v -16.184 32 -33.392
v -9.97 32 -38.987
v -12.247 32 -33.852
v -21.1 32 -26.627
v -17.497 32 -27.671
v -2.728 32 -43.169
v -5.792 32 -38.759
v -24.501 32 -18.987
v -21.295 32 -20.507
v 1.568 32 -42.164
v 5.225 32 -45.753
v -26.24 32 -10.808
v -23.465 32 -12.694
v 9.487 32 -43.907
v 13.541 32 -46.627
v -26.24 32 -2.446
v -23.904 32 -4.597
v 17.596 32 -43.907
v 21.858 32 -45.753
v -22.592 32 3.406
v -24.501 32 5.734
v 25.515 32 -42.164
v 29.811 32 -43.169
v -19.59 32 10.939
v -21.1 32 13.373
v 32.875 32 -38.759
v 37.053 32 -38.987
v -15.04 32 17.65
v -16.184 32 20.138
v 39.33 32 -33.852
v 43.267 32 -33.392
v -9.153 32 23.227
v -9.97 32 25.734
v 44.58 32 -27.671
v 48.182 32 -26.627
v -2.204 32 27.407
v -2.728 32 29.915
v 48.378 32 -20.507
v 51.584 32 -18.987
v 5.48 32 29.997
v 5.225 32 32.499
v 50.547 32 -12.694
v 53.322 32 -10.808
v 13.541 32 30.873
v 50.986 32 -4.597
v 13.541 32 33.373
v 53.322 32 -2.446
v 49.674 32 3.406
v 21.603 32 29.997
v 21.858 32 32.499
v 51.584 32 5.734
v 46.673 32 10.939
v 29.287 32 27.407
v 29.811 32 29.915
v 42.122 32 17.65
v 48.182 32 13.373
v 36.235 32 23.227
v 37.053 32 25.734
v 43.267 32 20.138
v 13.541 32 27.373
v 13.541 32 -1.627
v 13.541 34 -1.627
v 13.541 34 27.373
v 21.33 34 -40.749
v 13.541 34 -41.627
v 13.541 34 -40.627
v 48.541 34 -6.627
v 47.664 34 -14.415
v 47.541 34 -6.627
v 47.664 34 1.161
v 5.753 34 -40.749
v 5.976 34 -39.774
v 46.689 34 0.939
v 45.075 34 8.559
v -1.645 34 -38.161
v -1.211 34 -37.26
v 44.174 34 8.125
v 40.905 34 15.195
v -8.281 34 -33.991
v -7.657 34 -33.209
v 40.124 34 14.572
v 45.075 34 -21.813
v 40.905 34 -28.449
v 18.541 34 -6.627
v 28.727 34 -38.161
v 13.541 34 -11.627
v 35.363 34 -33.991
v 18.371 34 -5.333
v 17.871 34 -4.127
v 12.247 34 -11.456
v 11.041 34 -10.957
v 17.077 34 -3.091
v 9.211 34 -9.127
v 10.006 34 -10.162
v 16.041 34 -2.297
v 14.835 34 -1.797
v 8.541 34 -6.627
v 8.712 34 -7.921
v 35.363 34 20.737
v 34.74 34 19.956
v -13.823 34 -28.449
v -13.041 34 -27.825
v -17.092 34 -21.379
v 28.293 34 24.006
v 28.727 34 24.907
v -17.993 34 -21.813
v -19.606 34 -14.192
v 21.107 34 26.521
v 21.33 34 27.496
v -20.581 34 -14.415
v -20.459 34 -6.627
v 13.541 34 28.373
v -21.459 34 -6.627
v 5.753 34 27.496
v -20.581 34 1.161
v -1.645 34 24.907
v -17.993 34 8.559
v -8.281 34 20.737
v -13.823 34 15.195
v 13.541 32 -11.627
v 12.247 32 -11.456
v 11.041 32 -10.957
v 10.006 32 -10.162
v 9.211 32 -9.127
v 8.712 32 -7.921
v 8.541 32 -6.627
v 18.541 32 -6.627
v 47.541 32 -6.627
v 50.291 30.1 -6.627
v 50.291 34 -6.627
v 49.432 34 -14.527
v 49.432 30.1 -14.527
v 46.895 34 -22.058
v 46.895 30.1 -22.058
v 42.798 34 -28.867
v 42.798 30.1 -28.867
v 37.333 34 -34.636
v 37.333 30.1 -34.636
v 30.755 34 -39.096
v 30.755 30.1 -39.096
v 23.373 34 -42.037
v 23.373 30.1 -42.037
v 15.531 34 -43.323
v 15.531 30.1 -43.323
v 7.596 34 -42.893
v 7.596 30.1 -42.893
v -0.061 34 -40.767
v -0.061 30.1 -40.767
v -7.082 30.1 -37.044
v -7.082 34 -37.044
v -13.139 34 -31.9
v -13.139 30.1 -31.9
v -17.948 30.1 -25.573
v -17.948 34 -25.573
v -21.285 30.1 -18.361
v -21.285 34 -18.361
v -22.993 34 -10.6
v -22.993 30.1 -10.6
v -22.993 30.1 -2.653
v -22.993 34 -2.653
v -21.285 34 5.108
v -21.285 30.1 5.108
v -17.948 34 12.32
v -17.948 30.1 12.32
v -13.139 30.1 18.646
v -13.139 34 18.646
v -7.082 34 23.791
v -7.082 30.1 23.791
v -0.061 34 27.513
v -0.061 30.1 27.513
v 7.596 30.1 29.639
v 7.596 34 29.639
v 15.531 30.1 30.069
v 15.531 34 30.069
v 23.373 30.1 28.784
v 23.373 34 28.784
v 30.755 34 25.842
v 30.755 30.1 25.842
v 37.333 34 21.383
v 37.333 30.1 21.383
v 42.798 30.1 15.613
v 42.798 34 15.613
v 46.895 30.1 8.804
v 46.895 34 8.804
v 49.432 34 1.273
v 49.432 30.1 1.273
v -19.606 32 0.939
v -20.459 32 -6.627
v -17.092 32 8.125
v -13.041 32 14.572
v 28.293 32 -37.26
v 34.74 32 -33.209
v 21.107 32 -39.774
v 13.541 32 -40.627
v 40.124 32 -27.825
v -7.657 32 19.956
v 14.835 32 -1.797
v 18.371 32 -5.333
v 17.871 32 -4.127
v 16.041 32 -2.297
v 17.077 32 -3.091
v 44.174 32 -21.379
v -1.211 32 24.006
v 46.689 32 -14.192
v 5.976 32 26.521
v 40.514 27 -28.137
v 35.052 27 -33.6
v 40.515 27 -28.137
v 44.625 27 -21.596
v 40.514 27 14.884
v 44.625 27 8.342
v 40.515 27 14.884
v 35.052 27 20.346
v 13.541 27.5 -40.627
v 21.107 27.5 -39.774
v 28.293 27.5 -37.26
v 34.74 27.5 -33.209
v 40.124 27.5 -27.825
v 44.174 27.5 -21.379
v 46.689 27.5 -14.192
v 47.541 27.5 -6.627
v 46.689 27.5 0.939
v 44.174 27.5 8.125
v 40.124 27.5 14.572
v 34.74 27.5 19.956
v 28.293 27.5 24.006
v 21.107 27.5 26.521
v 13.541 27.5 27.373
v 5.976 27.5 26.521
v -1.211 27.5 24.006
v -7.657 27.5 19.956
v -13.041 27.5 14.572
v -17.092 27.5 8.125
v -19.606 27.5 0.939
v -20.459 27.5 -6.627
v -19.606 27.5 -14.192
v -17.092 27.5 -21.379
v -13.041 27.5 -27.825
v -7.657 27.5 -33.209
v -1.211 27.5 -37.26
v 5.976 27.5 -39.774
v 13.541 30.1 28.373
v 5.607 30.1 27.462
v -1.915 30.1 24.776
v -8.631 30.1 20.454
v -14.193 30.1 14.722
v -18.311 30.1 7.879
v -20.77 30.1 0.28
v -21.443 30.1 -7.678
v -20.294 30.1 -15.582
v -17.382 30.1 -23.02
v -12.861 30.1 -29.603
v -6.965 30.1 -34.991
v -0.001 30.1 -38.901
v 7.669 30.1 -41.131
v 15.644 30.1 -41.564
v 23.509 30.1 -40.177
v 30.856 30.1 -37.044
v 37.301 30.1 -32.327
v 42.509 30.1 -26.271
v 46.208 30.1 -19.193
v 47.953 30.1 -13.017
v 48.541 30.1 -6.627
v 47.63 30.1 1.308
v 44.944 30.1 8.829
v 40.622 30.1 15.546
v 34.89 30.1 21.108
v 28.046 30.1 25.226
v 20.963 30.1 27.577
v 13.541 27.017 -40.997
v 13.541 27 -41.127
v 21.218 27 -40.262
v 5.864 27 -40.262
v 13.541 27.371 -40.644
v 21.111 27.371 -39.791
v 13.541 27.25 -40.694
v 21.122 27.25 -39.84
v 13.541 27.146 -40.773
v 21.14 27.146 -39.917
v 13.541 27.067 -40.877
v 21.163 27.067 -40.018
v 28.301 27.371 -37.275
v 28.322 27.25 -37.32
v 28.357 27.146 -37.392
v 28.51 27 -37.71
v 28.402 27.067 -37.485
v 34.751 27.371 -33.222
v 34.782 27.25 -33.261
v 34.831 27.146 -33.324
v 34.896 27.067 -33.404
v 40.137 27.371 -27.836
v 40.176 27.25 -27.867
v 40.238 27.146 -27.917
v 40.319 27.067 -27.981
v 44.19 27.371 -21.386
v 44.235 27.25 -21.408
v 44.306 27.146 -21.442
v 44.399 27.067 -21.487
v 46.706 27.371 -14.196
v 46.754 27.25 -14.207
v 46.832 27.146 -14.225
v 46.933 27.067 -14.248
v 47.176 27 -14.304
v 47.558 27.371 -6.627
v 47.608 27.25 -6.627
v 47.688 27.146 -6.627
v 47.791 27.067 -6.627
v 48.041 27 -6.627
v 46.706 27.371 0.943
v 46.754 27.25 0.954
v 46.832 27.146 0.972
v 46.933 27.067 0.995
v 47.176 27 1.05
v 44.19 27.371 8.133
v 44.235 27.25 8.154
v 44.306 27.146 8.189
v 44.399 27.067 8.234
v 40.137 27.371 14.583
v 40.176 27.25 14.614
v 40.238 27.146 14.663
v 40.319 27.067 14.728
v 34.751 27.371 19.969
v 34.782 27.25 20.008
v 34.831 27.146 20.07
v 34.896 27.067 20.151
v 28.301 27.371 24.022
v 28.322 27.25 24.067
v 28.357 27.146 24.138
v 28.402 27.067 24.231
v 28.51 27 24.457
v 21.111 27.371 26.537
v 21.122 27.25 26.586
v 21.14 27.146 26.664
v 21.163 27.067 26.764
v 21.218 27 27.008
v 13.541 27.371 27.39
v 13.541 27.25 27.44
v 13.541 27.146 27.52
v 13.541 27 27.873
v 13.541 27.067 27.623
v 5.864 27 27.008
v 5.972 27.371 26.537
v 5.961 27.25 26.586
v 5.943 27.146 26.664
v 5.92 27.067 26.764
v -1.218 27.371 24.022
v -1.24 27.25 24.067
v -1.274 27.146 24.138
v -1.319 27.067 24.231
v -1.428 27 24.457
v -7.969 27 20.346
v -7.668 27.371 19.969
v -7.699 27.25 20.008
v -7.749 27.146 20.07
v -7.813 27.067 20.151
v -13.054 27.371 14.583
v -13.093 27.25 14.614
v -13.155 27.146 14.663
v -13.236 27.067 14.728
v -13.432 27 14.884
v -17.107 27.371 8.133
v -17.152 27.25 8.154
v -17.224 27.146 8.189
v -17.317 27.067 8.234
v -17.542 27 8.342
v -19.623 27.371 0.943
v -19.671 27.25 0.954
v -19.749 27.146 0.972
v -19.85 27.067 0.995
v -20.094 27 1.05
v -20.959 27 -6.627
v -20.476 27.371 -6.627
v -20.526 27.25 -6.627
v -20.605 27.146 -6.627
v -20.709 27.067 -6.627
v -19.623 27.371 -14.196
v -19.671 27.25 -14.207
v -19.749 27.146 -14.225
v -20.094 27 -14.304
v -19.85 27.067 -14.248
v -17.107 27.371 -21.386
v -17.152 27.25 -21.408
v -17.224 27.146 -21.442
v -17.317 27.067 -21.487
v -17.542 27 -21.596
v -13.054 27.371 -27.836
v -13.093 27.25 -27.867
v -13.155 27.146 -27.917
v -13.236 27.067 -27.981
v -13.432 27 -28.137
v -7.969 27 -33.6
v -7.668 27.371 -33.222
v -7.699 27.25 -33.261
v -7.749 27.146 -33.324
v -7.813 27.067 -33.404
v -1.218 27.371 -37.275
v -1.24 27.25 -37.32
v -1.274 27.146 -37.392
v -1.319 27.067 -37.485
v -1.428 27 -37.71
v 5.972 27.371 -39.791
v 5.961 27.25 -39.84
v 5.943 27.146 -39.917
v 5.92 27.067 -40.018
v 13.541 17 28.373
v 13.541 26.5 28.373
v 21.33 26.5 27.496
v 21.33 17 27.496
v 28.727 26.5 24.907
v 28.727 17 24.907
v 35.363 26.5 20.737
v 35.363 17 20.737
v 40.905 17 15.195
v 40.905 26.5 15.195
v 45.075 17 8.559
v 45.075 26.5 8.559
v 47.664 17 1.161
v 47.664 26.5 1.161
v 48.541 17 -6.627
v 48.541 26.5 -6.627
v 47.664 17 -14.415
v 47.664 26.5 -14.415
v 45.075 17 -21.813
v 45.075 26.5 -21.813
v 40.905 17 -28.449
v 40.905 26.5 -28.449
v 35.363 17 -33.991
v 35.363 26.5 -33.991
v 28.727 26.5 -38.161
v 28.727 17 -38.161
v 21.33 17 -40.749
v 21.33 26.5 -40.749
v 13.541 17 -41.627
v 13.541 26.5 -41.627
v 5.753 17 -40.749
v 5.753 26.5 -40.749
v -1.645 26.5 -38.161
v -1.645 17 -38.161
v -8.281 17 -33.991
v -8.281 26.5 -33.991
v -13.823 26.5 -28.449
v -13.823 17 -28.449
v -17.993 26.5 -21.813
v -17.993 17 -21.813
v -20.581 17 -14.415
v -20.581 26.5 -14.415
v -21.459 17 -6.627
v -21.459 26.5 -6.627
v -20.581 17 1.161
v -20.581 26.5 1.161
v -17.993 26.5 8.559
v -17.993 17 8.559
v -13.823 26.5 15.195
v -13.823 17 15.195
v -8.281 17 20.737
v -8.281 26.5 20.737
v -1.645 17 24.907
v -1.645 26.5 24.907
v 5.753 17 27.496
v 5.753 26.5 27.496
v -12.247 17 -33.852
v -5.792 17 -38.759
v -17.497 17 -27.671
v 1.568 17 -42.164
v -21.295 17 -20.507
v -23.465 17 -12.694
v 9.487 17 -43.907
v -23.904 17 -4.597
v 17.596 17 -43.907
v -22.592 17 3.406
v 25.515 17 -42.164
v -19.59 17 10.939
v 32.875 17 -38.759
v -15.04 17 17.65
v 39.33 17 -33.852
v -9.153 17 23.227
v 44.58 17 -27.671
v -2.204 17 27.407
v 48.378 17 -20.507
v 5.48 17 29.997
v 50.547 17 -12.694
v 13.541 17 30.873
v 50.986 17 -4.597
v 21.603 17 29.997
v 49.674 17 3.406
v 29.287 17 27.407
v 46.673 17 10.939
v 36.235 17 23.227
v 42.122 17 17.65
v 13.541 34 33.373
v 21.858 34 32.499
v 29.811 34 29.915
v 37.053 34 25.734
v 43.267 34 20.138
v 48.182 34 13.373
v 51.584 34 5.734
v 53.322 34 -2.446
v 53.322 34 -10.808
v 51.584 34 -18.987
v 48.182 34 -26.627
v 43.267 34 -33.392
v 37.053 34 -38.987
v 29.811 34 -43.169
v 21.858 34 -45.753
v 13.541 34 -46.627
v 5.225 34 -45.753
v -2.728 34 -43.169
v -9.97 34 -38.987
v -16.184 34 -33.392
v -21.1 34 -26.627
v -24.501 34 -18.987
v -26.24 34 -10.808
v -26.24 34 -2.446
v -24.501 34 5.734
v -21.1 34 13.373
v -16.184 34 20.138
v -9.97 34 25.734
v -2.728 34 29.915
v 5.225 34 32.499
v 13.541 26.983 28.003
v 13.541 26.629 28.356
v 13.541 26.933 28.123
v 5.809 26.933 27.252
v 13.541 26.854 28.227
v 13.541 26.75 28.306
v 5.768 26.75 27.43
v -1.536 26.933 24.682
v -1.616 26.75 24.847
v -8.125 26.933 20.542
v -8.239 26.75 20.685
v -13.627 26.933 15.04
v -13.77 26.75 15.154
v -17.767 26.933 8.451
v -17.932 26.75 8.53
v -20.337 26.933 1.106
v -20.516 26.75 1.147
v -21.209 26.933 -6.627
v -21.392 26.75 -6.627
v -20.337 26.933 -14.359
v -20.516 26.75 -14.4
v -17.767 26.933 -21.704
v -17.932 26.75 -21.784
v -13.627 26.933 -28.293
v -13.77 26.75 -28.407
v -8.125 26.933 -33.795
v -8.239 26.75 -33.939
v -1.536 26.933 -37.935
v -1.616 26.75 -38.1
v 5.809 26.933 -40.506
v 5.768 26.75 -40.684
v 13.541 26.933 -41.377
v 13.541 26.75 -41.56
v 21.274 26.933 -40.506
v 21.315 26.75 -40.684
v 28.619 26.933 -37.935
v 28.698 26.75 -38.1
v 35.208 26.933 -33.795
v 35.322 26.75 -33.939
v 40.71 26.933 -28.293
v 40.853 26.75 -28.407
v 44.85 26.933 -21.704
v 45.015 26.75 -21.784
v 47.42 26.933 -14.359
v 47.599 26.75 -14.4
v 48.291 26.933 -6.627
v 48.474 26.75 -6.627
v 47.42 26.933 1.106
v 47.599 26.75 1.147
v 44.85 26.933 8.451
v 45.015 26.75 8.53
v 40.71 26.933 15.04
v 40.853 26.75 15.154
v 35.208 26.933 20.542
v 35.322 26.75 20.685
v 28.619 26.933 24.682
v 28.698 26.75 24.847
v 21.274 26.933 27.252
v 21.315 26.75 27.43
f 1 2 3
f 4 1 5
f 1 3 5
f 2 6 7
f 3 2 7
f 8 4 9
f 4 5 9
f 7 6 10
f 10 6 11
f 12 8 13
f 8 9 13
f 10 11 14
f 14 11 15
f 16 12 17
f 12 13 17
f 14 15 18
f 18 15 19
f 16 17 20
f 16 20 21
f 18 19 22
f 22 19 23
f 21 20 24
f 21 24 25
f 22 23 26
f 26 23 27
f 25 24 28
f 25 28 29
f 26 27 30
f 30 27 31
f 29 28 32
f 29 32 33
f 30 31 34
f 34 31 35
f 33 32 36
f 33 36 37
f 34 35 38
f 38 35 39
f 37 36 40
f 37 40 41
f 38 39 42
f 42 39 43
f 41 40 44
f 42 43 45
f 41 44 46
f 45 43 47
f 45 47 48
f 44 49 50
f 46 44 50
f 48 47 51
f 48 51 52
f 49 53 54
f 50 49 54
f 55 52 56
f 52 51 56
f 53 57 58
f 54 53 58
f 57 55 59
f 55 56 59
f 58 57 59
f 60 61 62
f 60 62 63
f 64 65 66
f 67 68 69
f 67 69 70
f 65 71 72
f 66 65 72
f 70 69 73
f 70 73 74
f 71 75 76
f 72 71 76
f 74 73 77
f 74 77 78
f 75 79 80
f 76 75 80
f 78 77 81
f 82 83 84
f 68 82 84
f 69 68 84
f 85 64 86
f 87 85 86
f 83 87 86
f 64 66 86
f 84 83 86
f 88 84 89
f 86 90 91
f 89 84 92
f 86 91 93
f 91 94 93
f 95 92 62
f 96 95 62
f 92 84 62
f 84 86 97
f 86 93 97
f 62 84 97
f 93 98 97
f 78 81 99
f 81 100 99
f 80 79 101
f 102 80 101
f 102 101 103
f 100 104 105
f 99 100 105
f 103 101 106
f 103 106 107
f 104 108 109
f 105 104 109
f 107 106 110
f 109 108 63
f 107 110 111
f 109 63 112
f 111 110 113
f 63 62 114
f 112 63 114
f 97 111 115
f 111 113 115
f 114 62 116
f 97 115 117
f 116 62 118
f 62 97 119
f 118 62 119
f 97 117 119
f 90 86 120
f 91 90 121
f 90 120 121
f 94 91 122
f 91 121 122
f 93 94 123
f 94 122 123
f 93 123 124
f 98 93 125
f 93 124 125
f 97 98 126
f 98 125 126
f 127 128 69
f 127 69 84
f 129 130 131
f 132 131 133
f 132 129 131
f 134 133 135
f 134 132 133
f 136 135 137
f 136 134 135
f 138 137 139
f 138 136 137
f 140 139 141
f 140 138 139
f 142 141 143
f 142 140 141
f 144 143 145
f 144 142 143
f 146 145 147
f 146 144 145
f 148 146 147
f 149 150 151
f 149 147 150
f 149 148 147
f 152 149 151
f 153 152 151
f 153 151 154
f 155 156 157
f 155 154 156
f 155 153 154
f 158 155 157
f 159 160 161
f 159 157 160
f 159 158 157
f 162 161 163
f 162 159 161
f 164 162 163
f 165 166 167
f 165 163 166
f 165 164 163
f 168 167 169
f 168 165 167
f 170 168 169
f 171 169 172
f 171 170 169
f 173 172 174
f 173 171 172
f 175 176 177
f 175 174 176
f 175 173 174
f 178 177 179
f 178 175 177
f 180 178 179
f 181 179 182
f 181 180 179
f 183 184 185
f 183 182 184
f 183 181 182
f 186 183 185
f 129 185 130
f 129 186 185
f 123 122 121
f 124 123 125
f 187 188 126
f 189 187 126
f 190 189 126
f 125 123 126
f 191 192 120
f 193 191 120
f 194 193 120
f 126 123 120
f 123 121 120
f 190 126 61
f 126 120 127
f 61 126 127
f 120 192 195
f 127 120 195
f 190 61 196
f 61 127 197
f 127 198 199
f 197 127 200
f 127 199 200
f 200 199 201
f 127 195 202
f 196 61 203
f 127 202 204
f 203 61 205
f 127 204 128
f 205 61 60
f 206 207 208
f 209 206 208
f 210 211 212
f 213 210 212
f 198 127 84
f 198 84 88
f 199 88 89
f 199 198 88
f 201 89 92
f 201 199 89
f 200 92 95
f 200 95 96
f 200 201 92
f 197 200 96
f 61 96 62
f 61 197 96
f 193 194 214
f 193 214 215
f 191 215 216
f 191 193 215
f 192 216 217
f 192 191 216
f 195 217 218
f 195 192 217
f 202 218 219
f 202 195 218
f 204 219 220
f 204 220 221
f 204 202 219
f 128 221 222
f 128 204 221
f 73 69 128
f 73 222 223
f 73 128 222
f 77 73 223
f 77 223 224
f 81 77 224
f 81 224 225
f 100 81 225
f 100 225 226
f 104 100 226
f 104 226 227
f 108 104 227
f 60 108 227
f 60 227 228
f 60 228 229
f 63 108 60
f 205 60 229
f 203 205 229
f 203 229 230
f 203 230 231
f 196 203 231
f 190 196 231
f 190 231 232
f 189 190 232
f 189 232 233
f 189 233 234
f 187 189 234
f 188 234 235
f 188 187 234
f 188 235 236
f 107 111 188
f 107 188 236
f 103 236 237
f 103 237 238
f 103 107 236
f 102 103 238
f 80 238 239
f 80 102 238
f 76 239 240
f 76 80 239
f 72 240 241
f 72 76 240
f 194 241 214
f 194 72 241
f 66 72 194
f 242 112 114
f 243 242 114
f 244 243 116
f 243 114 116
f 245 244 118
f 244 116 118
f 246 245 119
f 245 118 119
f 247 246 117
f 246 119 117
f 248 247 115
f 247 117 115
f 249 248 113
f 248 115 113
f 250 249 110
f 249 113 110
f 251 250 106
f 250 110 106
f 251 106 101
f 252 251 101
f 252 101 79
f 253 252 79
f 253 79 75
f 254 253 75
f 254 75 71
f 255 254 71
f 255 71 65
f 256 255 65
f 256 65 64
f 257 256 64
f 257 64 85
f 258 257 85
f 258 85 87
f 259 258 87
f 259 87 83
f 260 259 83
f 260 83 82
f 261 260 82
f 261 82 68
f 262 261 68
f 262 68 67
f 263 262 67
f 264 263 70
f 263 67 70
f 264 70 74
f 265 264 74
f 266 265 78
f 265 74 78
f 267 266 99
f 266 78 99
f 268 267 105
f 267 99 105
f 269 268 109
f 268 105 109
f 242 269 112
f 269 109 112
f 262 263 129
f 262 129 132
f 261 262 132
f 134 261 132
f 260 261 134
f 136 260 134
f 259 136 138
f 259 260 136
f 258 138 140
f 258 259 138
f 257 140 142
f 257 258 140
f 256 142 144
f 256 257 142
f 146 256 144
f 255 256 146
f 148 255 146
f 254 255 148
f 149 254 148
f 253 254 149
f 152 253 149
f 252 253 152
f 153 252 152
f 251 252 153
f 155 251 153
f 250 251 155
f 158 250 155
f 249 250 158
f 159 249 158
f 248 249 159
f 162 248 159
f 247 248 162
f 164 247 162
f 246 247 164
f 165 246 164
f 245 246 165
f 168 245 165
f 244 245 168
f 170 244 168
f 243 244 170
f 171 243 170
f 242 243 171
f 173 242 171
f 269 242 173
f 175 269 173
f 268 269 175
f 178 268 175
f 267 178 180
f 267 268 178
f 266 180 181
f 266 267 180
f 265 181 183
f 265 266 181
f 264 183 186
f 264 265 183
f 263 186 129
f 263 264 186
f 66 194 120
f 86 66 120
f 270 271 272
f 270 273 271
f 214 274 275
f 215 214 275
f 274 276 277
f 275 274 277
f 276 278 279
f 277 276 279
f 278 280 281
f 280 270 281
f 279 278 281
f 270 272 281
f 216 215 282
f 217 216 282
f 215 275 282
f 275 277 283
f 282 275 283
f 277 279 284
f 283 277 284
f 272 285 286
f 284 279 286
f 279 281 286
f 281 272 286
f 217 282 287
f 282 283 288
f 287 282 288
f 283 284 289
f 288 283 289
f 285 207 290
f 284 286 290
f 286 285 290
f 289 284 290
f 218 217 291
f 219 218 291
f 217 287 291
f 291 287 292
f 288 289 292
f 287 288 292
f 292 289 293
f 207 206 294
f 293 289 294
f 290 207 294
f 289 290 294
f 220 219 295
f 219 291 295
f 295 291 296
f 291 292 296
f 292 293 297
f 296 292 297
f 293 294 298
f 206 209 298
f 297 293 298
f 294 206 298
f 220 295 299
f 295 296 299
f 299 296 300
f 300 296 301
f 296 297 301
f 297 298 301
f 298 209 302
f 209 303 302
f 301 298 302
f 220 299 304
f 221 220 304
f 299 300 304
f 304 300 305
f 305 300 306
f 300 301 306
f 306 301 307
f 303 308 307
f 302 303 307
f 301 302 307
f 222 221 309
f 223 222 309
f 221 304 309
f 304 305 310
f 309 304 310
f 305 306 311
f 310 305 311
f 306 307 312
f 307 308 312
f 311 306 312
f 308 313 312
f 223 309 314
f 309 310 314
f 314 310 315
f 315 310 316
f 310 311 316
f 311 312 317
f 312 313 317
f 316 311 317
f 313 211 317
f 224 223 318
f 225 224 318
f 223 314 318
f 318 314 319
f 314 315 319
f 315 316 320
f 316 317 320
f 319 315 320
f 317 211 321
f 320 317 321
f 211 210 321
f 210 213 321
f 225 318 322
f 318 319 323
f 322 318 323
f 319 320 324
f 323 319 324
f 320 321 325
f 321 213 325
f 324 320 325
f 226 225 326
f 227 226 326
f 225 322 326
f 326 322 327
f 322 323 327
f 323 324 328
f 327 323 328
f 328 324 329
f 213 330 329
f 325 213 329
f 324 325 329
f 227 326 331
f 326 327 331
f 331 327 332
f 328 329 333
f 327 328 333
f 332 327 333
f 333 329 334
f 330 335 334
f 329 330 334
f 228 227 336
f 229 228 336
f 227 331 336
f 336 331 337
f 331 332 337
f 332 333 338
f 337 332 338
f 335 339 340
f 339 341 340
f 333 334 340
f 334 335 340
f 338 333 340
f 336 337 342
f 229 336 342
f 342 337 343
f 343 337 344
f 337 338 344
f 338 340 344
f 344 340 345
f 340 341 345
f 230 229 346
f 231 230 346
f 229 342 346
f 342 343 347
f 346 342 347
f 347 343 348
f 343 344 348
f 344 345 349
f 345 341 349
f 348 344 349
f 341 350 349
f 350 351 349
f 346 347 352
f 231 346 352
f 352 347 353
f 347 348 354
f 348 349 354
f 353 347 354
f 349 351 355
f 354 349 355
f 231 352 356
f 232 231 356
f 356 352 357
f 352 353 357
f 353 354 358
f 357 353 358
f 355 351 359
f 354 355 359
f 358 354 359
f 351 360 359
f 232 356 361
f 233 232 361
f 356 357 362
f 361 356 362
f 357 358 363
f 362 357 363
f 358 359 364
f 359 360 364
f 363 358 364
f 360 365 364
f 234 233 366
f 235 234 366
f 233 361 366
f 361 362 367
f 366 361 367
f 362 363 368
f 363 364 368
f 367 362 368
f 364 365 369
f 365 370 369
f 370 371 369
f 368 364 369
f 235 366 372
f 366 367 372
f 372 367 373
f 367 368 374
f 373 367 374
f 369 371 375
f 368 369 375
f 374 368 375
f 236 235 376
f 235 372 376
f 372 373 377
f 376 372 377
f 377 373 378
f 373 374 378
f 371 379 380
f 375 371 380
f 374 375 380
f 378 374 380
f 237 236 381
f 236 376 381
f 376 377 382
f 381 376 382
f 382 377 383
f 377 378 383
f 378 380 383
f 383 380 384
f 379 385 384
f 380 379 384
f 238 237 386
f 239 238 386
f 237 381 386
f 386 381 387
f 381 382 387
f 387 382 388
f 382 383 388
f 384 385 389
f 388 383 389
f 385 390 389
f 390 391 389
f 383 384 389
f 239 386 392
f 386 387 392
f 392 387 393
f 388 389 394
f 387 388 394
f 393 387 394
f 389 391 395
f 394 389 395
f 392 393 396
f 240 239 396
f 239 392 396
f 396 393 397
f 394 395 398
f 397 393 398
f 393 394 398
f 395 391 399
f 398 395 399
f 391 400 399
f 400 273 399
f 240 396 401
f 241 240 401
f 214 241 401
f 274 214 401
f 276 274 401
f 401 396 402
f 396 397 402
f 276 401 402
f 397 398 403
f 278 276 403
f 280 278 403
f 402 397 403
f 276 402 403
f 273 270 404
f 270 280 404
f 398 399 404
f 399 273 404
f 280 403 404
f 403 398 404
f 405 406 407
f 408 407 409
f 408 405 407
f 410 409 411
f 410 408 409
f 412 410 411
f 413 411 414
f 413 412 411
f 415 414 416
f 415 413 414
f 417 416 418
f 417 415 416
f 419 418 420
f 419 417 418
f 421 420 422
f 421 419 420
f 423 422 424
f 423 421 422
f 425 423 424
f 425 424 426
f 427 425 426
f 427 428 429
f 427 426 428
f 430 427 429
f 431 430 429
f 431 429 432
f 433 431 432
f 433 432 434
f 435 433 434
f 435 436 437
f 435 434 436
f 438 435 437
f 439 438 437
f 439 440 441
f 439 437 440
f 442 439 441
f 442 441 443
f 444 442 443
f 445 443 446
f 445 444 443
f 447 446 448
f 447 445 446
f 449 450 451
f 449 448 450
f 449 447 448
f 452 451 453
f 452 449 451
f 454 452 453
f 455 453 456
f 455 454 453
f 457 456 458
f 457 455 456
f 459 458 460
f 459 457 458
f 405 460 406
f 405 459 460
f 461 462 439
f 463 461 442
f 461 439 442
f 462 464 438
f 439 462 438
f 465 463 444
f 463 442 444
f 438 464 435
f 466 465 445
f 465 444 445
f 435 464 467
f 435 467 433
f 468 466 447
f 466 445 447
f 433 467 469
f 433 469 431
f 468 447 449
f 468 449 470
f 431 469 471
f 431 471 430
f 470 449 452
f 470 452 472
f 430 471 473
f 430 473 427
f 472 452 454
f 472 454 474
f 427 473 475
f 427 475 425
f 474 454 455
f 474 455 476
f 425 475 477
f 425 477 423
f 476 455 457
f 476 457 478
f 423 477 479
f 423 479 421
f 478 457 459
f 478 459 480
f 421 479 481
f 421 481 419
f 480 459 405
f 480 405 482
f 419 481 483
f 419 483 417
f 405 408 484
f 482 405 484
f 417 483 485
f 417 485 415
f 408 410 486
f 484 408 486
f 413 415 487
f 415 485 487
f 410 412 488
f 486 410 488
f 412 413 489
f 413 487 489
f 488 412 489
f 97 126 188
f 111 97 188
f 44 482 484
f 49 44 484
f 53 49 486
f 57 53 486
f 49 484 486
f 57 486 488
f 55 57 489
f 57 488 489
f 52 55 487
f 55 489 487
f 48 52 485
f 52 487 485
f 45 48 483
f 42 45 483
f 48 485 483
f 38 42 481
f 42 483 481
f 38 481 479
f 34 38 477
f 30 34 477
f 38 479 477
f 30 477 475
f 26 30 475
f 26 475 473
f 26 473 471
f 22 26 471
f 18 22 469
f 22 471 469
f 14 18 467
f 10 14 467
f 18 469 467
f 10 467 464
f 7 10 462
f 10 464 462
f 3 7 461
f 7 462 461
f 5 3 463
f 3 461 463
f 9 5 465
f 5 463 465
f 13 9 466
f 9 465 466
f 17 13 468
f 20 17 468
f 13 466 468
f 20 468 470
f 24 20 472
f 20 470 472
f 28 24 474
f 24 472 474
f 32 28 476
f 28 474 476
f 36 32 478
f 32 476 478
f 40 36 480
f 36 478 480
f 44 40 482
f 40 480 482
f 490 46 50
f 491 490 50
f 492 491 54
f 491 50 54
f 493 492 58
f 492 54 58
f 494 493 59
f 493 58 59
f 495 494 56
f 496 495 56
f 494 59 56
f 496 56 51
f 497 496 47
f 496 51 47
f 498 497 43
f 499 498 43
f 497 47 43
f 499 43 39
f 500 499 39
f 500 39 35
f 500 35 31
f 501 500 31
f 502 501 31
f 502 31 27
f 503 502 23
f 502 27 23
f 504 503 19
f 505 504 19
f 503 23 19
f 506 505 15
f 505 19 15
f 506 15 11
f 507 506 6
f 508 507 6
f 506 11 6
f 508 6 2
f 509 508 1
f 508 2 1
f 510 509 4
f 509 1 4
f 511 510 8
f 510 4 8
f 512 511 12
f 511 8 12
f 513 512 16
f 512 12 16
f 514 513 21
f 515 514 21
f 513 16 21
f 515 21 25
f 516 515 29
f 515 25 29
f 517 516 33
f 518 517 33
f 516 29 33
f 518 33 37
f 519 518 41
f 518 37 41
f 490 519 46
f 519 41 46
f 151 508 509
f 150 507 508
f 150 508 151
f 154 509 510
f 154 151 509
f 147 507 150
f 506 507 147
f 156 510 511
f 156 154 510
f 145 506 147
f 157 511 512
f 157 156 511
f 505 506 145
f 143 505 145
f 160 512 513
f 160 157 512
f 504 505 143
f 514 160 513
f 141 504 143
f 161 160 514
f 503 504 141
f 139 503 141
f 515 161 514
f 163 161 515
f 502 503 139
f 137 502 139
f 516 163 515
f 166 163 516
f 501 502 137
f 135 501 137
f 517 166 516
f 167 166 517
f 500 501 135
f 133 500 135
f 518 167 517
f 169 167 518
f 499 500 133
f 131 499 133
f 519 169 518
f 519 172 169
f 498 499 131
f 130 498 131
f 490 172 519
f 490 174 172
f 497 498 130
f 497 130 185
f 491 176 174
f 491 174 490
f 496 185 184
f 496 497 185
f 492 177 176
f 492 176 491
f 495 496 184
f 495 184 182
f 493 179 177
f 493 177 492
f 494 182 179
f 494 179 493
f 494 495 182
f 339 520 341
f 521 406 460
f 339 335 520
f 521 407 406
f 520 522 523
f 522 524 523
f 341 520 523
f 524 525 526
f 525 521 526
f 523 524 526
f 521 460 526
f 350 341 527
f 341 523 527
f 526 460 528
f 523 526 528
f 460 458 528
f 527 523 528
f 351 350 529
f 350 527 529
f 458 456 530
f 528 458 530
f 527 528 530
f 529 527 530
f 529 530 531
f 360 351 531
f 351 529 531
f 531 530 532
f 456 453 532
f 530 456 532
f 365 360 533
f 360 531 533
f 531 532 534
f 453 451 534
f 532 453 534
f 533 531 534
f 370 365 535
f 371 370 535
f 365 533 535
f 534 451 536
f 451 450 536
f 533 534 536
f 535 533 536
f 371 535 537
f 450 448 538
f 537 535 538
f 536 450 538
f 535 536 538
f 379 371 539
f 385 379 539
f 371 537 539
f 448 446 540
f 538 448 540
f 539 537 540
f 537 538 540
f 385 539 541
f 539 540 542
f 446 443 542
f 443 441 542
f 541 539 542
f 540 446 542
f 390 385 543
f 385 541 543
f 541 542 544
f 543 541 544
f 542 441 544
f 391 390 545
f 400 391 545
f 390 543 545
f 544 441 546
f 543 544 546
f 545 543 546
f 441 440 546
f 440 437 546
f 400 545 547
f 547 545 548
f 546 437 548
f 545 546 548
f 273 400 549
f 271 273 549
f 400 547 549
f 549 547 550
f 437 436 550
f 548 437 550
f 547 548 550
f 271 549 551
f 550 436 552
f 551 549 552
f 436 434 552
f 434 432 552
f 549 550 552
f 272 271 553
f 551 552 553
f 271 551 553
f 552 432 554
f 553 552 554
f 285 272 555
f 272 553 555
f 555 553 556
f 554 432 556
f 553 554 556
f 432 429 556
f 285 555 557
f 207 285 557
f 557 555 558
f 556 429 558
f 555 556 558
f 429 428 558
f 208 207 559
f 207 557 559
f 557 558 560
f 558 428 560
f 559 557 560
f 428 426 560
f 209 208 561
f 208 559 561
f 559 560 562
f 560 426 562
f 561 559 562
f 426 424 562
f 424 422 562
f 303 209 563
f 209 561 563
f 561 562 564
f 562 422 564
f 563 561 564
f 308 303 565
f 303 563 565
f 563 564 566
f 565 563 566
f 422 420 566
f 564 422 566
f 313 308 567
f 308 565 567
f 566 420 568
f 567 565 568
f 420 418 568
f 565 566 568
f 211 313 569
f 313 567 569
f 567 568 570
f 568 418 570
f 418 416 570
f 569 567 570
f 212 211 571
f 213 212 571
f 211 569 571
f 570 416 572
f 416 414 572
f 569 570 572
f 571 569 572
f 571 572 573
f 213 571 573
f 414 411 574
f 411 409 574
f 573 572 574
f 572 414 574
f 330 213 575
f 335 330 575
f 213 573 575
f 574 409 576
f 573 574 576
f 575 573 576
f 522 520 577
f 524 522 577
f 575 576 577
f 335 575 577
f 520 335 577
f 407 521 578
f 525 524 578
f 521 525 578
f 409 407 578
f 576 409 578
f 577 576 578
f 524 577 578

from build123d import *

# Parameters (mm, degrees)
CROQUIS1_R              = 37.5
CROQUIS1_R_2            = 35
SALIENTE_EXTRUIR1_DEPTH = 15
CROQUIS2_R              = 40
SALIENTE_EXTRUIR2_DEPTH = 2
CORTAR_EXTRUIR1_DEPTH   = 10
CROQUIS5_W              = 2
CROQUIS5_H              = 4
SALIENTE_EXTRUIR3_START = -2
CROQUIS8_R              = 35
CROQUIS8_R_2            = 34
SALIENTE_EXTRUIR3_DEPTH = 7
REDONDEO1_R             = 0.5


with BuildPart() as part:
    # Croquis1 → Saliente-Extruir1 (new body)
    with BuildSketch(Plane(origin=(0, 17, 0), x_dir=(1, 0, 0), z_dir=(0, 1, 0))):
        with Locations(Location((13.541348433, 6.626768313, 0), (0, 0, 270))):
            Circle(CROQUIS1_R)
        with Locations(Location((13.541348433, 6.626768313, 0), (0, 0, 270))):
            Circle(CROQUIS1_R_2, mode=Mode.SUBTRACT)
    extrude(amount=SALIENTE_EXTRUIR1_DEPTH)

    # Croquis2 → Saliente-Extruir2 (add)
    with BuildSketch(Plane(origin=(0, 32, 0), x_dir=(1, 0, 0), z_dir=(0, 1, 0))):
        with Locations(Location((13.541348433, 6.626768313, 0), (0, 0, 270))):
            Circle(CROQUIS2_R)
    extrude(amount=SALIENTE_EXTRUIR2_DEPTH)

    # Croquis7 → Cortar-Extruir1 (cut)
    with BuildSketch(Plane.XZ.offset(-32)):
        with BuildLine():
            Line((13.541348433, -41.626768313), (13.541348433, -11.626768313))
            ThreePointArc((13.541348433, -11.626768313), (10.005814527, -10.162302219), (8.541348433, -6.626768313))
            Line((8.541348433, -6.626768313), (-21.458651567, -6.626768313))
            ThreePointArc((-21.458651567, -6.626768313), (-11.207388908, -31.375505654), (13.541348433, -41.626768313))
        make_face()
        with BuildLine():
            Line((48.541348433, -6.626768313), (18.541348433, -6.626768313))
            ThreePointArc((18.541348433, -6.626768313), (17.076882339, -3.091234407), (13.541348433, -1.626768313))
            Line((13.541348433, -1.626768313), (13.541348433, 28.373231687))
            ThreePointArc((13.541348433, 28.373231687), (38.290085775, 18.121969029), (48.541348433, -6.626768313))
        make_face()
    extrude(amount=-CORTAR_EXTRUIR1_DEPTH, mode=Mode.SUBTRACT)

    # Cortar-Barrer1: sweep along a path in Croquis6
    with BuildLine(Plane(origin=(0, 33, 0), x_dir=(1, 0, 0), z_dir=(0, 1, 0))) as cortar_barrer1_path:
        CenterArc((13.541348433, 6.626768313), 36.25, 0, 360)
    # Croquis5 → Cortar-Barrer1 (sweep, cut)
    with BuildSketch(Plane.XY.offset(-6.626768313)):
        with Locations((-22.208651567, 32.1)):
            Rectangle(CROQUIS5_W, CROQUIS5_H)
    sweep(path=cortar_barrer1_path.line, mode=Mode.SUBTRACT)


with BuildPart() as cortar_barrer1_piece_1:
    # of the separate pieces the step leaves, piece 1, a body of its own (cortar_barrer1_pieces)
    add(part.part.solids().sort_by_distance((13.541348433, 32, 33.373231687))[0])



with BuildPart() as cortar_barrer1_piece_2:
    # of the separate pieces the step leaves, piece 2, a body of its own (cortar_barrer1_pieces)
    add(part.part.solids().sort_by_distance((18.541348433, 34, -6.626768313))[0])


with BuildPart() as cortar_barrer1_piece_1_1:
    add(cortar_barrer1_piece_1.part)

    add(cortar_barrer1_piece_2.part)  # Saliente-Extruir3 merges Cortar-Barrer1 piece 2
    # Croquis8 → Saliente-Extruir3 (add)
    with BuildSketch(Plane.XZ.offset(-32).offset(SALIENTE_EXTRUIR3_START)):
        with Locations(Location((13.541348433, -6.626768313, 0), (0, 0, 90))):
            Circle(CROQUIS8_R)
        with Locations(Location((13.541348433, -6.626768313, 0), (0, 0, 270))):
            Circle(CROQUIS8_R_2, mode=Mode.SUBTRACT)
    extrude(amount=SALIENTE_EXTRUIR3_DEPTH)

    # Redondeo1
    redondeo1_edges = [cortar_barrer1_piece_1_1.edges().sort_by_distance(p)[0] for p in [
        (13.541348433, 27, 27.373231687),
        (13.541348433, 27, -41.626768313),
    ]]
    fillet(redondeo1_edges, radius=REDONDEO1_R - 0.0001)  # a hair under: the kernel refuses the full size


solid = cortar_barrer1_piece_1_1.part
